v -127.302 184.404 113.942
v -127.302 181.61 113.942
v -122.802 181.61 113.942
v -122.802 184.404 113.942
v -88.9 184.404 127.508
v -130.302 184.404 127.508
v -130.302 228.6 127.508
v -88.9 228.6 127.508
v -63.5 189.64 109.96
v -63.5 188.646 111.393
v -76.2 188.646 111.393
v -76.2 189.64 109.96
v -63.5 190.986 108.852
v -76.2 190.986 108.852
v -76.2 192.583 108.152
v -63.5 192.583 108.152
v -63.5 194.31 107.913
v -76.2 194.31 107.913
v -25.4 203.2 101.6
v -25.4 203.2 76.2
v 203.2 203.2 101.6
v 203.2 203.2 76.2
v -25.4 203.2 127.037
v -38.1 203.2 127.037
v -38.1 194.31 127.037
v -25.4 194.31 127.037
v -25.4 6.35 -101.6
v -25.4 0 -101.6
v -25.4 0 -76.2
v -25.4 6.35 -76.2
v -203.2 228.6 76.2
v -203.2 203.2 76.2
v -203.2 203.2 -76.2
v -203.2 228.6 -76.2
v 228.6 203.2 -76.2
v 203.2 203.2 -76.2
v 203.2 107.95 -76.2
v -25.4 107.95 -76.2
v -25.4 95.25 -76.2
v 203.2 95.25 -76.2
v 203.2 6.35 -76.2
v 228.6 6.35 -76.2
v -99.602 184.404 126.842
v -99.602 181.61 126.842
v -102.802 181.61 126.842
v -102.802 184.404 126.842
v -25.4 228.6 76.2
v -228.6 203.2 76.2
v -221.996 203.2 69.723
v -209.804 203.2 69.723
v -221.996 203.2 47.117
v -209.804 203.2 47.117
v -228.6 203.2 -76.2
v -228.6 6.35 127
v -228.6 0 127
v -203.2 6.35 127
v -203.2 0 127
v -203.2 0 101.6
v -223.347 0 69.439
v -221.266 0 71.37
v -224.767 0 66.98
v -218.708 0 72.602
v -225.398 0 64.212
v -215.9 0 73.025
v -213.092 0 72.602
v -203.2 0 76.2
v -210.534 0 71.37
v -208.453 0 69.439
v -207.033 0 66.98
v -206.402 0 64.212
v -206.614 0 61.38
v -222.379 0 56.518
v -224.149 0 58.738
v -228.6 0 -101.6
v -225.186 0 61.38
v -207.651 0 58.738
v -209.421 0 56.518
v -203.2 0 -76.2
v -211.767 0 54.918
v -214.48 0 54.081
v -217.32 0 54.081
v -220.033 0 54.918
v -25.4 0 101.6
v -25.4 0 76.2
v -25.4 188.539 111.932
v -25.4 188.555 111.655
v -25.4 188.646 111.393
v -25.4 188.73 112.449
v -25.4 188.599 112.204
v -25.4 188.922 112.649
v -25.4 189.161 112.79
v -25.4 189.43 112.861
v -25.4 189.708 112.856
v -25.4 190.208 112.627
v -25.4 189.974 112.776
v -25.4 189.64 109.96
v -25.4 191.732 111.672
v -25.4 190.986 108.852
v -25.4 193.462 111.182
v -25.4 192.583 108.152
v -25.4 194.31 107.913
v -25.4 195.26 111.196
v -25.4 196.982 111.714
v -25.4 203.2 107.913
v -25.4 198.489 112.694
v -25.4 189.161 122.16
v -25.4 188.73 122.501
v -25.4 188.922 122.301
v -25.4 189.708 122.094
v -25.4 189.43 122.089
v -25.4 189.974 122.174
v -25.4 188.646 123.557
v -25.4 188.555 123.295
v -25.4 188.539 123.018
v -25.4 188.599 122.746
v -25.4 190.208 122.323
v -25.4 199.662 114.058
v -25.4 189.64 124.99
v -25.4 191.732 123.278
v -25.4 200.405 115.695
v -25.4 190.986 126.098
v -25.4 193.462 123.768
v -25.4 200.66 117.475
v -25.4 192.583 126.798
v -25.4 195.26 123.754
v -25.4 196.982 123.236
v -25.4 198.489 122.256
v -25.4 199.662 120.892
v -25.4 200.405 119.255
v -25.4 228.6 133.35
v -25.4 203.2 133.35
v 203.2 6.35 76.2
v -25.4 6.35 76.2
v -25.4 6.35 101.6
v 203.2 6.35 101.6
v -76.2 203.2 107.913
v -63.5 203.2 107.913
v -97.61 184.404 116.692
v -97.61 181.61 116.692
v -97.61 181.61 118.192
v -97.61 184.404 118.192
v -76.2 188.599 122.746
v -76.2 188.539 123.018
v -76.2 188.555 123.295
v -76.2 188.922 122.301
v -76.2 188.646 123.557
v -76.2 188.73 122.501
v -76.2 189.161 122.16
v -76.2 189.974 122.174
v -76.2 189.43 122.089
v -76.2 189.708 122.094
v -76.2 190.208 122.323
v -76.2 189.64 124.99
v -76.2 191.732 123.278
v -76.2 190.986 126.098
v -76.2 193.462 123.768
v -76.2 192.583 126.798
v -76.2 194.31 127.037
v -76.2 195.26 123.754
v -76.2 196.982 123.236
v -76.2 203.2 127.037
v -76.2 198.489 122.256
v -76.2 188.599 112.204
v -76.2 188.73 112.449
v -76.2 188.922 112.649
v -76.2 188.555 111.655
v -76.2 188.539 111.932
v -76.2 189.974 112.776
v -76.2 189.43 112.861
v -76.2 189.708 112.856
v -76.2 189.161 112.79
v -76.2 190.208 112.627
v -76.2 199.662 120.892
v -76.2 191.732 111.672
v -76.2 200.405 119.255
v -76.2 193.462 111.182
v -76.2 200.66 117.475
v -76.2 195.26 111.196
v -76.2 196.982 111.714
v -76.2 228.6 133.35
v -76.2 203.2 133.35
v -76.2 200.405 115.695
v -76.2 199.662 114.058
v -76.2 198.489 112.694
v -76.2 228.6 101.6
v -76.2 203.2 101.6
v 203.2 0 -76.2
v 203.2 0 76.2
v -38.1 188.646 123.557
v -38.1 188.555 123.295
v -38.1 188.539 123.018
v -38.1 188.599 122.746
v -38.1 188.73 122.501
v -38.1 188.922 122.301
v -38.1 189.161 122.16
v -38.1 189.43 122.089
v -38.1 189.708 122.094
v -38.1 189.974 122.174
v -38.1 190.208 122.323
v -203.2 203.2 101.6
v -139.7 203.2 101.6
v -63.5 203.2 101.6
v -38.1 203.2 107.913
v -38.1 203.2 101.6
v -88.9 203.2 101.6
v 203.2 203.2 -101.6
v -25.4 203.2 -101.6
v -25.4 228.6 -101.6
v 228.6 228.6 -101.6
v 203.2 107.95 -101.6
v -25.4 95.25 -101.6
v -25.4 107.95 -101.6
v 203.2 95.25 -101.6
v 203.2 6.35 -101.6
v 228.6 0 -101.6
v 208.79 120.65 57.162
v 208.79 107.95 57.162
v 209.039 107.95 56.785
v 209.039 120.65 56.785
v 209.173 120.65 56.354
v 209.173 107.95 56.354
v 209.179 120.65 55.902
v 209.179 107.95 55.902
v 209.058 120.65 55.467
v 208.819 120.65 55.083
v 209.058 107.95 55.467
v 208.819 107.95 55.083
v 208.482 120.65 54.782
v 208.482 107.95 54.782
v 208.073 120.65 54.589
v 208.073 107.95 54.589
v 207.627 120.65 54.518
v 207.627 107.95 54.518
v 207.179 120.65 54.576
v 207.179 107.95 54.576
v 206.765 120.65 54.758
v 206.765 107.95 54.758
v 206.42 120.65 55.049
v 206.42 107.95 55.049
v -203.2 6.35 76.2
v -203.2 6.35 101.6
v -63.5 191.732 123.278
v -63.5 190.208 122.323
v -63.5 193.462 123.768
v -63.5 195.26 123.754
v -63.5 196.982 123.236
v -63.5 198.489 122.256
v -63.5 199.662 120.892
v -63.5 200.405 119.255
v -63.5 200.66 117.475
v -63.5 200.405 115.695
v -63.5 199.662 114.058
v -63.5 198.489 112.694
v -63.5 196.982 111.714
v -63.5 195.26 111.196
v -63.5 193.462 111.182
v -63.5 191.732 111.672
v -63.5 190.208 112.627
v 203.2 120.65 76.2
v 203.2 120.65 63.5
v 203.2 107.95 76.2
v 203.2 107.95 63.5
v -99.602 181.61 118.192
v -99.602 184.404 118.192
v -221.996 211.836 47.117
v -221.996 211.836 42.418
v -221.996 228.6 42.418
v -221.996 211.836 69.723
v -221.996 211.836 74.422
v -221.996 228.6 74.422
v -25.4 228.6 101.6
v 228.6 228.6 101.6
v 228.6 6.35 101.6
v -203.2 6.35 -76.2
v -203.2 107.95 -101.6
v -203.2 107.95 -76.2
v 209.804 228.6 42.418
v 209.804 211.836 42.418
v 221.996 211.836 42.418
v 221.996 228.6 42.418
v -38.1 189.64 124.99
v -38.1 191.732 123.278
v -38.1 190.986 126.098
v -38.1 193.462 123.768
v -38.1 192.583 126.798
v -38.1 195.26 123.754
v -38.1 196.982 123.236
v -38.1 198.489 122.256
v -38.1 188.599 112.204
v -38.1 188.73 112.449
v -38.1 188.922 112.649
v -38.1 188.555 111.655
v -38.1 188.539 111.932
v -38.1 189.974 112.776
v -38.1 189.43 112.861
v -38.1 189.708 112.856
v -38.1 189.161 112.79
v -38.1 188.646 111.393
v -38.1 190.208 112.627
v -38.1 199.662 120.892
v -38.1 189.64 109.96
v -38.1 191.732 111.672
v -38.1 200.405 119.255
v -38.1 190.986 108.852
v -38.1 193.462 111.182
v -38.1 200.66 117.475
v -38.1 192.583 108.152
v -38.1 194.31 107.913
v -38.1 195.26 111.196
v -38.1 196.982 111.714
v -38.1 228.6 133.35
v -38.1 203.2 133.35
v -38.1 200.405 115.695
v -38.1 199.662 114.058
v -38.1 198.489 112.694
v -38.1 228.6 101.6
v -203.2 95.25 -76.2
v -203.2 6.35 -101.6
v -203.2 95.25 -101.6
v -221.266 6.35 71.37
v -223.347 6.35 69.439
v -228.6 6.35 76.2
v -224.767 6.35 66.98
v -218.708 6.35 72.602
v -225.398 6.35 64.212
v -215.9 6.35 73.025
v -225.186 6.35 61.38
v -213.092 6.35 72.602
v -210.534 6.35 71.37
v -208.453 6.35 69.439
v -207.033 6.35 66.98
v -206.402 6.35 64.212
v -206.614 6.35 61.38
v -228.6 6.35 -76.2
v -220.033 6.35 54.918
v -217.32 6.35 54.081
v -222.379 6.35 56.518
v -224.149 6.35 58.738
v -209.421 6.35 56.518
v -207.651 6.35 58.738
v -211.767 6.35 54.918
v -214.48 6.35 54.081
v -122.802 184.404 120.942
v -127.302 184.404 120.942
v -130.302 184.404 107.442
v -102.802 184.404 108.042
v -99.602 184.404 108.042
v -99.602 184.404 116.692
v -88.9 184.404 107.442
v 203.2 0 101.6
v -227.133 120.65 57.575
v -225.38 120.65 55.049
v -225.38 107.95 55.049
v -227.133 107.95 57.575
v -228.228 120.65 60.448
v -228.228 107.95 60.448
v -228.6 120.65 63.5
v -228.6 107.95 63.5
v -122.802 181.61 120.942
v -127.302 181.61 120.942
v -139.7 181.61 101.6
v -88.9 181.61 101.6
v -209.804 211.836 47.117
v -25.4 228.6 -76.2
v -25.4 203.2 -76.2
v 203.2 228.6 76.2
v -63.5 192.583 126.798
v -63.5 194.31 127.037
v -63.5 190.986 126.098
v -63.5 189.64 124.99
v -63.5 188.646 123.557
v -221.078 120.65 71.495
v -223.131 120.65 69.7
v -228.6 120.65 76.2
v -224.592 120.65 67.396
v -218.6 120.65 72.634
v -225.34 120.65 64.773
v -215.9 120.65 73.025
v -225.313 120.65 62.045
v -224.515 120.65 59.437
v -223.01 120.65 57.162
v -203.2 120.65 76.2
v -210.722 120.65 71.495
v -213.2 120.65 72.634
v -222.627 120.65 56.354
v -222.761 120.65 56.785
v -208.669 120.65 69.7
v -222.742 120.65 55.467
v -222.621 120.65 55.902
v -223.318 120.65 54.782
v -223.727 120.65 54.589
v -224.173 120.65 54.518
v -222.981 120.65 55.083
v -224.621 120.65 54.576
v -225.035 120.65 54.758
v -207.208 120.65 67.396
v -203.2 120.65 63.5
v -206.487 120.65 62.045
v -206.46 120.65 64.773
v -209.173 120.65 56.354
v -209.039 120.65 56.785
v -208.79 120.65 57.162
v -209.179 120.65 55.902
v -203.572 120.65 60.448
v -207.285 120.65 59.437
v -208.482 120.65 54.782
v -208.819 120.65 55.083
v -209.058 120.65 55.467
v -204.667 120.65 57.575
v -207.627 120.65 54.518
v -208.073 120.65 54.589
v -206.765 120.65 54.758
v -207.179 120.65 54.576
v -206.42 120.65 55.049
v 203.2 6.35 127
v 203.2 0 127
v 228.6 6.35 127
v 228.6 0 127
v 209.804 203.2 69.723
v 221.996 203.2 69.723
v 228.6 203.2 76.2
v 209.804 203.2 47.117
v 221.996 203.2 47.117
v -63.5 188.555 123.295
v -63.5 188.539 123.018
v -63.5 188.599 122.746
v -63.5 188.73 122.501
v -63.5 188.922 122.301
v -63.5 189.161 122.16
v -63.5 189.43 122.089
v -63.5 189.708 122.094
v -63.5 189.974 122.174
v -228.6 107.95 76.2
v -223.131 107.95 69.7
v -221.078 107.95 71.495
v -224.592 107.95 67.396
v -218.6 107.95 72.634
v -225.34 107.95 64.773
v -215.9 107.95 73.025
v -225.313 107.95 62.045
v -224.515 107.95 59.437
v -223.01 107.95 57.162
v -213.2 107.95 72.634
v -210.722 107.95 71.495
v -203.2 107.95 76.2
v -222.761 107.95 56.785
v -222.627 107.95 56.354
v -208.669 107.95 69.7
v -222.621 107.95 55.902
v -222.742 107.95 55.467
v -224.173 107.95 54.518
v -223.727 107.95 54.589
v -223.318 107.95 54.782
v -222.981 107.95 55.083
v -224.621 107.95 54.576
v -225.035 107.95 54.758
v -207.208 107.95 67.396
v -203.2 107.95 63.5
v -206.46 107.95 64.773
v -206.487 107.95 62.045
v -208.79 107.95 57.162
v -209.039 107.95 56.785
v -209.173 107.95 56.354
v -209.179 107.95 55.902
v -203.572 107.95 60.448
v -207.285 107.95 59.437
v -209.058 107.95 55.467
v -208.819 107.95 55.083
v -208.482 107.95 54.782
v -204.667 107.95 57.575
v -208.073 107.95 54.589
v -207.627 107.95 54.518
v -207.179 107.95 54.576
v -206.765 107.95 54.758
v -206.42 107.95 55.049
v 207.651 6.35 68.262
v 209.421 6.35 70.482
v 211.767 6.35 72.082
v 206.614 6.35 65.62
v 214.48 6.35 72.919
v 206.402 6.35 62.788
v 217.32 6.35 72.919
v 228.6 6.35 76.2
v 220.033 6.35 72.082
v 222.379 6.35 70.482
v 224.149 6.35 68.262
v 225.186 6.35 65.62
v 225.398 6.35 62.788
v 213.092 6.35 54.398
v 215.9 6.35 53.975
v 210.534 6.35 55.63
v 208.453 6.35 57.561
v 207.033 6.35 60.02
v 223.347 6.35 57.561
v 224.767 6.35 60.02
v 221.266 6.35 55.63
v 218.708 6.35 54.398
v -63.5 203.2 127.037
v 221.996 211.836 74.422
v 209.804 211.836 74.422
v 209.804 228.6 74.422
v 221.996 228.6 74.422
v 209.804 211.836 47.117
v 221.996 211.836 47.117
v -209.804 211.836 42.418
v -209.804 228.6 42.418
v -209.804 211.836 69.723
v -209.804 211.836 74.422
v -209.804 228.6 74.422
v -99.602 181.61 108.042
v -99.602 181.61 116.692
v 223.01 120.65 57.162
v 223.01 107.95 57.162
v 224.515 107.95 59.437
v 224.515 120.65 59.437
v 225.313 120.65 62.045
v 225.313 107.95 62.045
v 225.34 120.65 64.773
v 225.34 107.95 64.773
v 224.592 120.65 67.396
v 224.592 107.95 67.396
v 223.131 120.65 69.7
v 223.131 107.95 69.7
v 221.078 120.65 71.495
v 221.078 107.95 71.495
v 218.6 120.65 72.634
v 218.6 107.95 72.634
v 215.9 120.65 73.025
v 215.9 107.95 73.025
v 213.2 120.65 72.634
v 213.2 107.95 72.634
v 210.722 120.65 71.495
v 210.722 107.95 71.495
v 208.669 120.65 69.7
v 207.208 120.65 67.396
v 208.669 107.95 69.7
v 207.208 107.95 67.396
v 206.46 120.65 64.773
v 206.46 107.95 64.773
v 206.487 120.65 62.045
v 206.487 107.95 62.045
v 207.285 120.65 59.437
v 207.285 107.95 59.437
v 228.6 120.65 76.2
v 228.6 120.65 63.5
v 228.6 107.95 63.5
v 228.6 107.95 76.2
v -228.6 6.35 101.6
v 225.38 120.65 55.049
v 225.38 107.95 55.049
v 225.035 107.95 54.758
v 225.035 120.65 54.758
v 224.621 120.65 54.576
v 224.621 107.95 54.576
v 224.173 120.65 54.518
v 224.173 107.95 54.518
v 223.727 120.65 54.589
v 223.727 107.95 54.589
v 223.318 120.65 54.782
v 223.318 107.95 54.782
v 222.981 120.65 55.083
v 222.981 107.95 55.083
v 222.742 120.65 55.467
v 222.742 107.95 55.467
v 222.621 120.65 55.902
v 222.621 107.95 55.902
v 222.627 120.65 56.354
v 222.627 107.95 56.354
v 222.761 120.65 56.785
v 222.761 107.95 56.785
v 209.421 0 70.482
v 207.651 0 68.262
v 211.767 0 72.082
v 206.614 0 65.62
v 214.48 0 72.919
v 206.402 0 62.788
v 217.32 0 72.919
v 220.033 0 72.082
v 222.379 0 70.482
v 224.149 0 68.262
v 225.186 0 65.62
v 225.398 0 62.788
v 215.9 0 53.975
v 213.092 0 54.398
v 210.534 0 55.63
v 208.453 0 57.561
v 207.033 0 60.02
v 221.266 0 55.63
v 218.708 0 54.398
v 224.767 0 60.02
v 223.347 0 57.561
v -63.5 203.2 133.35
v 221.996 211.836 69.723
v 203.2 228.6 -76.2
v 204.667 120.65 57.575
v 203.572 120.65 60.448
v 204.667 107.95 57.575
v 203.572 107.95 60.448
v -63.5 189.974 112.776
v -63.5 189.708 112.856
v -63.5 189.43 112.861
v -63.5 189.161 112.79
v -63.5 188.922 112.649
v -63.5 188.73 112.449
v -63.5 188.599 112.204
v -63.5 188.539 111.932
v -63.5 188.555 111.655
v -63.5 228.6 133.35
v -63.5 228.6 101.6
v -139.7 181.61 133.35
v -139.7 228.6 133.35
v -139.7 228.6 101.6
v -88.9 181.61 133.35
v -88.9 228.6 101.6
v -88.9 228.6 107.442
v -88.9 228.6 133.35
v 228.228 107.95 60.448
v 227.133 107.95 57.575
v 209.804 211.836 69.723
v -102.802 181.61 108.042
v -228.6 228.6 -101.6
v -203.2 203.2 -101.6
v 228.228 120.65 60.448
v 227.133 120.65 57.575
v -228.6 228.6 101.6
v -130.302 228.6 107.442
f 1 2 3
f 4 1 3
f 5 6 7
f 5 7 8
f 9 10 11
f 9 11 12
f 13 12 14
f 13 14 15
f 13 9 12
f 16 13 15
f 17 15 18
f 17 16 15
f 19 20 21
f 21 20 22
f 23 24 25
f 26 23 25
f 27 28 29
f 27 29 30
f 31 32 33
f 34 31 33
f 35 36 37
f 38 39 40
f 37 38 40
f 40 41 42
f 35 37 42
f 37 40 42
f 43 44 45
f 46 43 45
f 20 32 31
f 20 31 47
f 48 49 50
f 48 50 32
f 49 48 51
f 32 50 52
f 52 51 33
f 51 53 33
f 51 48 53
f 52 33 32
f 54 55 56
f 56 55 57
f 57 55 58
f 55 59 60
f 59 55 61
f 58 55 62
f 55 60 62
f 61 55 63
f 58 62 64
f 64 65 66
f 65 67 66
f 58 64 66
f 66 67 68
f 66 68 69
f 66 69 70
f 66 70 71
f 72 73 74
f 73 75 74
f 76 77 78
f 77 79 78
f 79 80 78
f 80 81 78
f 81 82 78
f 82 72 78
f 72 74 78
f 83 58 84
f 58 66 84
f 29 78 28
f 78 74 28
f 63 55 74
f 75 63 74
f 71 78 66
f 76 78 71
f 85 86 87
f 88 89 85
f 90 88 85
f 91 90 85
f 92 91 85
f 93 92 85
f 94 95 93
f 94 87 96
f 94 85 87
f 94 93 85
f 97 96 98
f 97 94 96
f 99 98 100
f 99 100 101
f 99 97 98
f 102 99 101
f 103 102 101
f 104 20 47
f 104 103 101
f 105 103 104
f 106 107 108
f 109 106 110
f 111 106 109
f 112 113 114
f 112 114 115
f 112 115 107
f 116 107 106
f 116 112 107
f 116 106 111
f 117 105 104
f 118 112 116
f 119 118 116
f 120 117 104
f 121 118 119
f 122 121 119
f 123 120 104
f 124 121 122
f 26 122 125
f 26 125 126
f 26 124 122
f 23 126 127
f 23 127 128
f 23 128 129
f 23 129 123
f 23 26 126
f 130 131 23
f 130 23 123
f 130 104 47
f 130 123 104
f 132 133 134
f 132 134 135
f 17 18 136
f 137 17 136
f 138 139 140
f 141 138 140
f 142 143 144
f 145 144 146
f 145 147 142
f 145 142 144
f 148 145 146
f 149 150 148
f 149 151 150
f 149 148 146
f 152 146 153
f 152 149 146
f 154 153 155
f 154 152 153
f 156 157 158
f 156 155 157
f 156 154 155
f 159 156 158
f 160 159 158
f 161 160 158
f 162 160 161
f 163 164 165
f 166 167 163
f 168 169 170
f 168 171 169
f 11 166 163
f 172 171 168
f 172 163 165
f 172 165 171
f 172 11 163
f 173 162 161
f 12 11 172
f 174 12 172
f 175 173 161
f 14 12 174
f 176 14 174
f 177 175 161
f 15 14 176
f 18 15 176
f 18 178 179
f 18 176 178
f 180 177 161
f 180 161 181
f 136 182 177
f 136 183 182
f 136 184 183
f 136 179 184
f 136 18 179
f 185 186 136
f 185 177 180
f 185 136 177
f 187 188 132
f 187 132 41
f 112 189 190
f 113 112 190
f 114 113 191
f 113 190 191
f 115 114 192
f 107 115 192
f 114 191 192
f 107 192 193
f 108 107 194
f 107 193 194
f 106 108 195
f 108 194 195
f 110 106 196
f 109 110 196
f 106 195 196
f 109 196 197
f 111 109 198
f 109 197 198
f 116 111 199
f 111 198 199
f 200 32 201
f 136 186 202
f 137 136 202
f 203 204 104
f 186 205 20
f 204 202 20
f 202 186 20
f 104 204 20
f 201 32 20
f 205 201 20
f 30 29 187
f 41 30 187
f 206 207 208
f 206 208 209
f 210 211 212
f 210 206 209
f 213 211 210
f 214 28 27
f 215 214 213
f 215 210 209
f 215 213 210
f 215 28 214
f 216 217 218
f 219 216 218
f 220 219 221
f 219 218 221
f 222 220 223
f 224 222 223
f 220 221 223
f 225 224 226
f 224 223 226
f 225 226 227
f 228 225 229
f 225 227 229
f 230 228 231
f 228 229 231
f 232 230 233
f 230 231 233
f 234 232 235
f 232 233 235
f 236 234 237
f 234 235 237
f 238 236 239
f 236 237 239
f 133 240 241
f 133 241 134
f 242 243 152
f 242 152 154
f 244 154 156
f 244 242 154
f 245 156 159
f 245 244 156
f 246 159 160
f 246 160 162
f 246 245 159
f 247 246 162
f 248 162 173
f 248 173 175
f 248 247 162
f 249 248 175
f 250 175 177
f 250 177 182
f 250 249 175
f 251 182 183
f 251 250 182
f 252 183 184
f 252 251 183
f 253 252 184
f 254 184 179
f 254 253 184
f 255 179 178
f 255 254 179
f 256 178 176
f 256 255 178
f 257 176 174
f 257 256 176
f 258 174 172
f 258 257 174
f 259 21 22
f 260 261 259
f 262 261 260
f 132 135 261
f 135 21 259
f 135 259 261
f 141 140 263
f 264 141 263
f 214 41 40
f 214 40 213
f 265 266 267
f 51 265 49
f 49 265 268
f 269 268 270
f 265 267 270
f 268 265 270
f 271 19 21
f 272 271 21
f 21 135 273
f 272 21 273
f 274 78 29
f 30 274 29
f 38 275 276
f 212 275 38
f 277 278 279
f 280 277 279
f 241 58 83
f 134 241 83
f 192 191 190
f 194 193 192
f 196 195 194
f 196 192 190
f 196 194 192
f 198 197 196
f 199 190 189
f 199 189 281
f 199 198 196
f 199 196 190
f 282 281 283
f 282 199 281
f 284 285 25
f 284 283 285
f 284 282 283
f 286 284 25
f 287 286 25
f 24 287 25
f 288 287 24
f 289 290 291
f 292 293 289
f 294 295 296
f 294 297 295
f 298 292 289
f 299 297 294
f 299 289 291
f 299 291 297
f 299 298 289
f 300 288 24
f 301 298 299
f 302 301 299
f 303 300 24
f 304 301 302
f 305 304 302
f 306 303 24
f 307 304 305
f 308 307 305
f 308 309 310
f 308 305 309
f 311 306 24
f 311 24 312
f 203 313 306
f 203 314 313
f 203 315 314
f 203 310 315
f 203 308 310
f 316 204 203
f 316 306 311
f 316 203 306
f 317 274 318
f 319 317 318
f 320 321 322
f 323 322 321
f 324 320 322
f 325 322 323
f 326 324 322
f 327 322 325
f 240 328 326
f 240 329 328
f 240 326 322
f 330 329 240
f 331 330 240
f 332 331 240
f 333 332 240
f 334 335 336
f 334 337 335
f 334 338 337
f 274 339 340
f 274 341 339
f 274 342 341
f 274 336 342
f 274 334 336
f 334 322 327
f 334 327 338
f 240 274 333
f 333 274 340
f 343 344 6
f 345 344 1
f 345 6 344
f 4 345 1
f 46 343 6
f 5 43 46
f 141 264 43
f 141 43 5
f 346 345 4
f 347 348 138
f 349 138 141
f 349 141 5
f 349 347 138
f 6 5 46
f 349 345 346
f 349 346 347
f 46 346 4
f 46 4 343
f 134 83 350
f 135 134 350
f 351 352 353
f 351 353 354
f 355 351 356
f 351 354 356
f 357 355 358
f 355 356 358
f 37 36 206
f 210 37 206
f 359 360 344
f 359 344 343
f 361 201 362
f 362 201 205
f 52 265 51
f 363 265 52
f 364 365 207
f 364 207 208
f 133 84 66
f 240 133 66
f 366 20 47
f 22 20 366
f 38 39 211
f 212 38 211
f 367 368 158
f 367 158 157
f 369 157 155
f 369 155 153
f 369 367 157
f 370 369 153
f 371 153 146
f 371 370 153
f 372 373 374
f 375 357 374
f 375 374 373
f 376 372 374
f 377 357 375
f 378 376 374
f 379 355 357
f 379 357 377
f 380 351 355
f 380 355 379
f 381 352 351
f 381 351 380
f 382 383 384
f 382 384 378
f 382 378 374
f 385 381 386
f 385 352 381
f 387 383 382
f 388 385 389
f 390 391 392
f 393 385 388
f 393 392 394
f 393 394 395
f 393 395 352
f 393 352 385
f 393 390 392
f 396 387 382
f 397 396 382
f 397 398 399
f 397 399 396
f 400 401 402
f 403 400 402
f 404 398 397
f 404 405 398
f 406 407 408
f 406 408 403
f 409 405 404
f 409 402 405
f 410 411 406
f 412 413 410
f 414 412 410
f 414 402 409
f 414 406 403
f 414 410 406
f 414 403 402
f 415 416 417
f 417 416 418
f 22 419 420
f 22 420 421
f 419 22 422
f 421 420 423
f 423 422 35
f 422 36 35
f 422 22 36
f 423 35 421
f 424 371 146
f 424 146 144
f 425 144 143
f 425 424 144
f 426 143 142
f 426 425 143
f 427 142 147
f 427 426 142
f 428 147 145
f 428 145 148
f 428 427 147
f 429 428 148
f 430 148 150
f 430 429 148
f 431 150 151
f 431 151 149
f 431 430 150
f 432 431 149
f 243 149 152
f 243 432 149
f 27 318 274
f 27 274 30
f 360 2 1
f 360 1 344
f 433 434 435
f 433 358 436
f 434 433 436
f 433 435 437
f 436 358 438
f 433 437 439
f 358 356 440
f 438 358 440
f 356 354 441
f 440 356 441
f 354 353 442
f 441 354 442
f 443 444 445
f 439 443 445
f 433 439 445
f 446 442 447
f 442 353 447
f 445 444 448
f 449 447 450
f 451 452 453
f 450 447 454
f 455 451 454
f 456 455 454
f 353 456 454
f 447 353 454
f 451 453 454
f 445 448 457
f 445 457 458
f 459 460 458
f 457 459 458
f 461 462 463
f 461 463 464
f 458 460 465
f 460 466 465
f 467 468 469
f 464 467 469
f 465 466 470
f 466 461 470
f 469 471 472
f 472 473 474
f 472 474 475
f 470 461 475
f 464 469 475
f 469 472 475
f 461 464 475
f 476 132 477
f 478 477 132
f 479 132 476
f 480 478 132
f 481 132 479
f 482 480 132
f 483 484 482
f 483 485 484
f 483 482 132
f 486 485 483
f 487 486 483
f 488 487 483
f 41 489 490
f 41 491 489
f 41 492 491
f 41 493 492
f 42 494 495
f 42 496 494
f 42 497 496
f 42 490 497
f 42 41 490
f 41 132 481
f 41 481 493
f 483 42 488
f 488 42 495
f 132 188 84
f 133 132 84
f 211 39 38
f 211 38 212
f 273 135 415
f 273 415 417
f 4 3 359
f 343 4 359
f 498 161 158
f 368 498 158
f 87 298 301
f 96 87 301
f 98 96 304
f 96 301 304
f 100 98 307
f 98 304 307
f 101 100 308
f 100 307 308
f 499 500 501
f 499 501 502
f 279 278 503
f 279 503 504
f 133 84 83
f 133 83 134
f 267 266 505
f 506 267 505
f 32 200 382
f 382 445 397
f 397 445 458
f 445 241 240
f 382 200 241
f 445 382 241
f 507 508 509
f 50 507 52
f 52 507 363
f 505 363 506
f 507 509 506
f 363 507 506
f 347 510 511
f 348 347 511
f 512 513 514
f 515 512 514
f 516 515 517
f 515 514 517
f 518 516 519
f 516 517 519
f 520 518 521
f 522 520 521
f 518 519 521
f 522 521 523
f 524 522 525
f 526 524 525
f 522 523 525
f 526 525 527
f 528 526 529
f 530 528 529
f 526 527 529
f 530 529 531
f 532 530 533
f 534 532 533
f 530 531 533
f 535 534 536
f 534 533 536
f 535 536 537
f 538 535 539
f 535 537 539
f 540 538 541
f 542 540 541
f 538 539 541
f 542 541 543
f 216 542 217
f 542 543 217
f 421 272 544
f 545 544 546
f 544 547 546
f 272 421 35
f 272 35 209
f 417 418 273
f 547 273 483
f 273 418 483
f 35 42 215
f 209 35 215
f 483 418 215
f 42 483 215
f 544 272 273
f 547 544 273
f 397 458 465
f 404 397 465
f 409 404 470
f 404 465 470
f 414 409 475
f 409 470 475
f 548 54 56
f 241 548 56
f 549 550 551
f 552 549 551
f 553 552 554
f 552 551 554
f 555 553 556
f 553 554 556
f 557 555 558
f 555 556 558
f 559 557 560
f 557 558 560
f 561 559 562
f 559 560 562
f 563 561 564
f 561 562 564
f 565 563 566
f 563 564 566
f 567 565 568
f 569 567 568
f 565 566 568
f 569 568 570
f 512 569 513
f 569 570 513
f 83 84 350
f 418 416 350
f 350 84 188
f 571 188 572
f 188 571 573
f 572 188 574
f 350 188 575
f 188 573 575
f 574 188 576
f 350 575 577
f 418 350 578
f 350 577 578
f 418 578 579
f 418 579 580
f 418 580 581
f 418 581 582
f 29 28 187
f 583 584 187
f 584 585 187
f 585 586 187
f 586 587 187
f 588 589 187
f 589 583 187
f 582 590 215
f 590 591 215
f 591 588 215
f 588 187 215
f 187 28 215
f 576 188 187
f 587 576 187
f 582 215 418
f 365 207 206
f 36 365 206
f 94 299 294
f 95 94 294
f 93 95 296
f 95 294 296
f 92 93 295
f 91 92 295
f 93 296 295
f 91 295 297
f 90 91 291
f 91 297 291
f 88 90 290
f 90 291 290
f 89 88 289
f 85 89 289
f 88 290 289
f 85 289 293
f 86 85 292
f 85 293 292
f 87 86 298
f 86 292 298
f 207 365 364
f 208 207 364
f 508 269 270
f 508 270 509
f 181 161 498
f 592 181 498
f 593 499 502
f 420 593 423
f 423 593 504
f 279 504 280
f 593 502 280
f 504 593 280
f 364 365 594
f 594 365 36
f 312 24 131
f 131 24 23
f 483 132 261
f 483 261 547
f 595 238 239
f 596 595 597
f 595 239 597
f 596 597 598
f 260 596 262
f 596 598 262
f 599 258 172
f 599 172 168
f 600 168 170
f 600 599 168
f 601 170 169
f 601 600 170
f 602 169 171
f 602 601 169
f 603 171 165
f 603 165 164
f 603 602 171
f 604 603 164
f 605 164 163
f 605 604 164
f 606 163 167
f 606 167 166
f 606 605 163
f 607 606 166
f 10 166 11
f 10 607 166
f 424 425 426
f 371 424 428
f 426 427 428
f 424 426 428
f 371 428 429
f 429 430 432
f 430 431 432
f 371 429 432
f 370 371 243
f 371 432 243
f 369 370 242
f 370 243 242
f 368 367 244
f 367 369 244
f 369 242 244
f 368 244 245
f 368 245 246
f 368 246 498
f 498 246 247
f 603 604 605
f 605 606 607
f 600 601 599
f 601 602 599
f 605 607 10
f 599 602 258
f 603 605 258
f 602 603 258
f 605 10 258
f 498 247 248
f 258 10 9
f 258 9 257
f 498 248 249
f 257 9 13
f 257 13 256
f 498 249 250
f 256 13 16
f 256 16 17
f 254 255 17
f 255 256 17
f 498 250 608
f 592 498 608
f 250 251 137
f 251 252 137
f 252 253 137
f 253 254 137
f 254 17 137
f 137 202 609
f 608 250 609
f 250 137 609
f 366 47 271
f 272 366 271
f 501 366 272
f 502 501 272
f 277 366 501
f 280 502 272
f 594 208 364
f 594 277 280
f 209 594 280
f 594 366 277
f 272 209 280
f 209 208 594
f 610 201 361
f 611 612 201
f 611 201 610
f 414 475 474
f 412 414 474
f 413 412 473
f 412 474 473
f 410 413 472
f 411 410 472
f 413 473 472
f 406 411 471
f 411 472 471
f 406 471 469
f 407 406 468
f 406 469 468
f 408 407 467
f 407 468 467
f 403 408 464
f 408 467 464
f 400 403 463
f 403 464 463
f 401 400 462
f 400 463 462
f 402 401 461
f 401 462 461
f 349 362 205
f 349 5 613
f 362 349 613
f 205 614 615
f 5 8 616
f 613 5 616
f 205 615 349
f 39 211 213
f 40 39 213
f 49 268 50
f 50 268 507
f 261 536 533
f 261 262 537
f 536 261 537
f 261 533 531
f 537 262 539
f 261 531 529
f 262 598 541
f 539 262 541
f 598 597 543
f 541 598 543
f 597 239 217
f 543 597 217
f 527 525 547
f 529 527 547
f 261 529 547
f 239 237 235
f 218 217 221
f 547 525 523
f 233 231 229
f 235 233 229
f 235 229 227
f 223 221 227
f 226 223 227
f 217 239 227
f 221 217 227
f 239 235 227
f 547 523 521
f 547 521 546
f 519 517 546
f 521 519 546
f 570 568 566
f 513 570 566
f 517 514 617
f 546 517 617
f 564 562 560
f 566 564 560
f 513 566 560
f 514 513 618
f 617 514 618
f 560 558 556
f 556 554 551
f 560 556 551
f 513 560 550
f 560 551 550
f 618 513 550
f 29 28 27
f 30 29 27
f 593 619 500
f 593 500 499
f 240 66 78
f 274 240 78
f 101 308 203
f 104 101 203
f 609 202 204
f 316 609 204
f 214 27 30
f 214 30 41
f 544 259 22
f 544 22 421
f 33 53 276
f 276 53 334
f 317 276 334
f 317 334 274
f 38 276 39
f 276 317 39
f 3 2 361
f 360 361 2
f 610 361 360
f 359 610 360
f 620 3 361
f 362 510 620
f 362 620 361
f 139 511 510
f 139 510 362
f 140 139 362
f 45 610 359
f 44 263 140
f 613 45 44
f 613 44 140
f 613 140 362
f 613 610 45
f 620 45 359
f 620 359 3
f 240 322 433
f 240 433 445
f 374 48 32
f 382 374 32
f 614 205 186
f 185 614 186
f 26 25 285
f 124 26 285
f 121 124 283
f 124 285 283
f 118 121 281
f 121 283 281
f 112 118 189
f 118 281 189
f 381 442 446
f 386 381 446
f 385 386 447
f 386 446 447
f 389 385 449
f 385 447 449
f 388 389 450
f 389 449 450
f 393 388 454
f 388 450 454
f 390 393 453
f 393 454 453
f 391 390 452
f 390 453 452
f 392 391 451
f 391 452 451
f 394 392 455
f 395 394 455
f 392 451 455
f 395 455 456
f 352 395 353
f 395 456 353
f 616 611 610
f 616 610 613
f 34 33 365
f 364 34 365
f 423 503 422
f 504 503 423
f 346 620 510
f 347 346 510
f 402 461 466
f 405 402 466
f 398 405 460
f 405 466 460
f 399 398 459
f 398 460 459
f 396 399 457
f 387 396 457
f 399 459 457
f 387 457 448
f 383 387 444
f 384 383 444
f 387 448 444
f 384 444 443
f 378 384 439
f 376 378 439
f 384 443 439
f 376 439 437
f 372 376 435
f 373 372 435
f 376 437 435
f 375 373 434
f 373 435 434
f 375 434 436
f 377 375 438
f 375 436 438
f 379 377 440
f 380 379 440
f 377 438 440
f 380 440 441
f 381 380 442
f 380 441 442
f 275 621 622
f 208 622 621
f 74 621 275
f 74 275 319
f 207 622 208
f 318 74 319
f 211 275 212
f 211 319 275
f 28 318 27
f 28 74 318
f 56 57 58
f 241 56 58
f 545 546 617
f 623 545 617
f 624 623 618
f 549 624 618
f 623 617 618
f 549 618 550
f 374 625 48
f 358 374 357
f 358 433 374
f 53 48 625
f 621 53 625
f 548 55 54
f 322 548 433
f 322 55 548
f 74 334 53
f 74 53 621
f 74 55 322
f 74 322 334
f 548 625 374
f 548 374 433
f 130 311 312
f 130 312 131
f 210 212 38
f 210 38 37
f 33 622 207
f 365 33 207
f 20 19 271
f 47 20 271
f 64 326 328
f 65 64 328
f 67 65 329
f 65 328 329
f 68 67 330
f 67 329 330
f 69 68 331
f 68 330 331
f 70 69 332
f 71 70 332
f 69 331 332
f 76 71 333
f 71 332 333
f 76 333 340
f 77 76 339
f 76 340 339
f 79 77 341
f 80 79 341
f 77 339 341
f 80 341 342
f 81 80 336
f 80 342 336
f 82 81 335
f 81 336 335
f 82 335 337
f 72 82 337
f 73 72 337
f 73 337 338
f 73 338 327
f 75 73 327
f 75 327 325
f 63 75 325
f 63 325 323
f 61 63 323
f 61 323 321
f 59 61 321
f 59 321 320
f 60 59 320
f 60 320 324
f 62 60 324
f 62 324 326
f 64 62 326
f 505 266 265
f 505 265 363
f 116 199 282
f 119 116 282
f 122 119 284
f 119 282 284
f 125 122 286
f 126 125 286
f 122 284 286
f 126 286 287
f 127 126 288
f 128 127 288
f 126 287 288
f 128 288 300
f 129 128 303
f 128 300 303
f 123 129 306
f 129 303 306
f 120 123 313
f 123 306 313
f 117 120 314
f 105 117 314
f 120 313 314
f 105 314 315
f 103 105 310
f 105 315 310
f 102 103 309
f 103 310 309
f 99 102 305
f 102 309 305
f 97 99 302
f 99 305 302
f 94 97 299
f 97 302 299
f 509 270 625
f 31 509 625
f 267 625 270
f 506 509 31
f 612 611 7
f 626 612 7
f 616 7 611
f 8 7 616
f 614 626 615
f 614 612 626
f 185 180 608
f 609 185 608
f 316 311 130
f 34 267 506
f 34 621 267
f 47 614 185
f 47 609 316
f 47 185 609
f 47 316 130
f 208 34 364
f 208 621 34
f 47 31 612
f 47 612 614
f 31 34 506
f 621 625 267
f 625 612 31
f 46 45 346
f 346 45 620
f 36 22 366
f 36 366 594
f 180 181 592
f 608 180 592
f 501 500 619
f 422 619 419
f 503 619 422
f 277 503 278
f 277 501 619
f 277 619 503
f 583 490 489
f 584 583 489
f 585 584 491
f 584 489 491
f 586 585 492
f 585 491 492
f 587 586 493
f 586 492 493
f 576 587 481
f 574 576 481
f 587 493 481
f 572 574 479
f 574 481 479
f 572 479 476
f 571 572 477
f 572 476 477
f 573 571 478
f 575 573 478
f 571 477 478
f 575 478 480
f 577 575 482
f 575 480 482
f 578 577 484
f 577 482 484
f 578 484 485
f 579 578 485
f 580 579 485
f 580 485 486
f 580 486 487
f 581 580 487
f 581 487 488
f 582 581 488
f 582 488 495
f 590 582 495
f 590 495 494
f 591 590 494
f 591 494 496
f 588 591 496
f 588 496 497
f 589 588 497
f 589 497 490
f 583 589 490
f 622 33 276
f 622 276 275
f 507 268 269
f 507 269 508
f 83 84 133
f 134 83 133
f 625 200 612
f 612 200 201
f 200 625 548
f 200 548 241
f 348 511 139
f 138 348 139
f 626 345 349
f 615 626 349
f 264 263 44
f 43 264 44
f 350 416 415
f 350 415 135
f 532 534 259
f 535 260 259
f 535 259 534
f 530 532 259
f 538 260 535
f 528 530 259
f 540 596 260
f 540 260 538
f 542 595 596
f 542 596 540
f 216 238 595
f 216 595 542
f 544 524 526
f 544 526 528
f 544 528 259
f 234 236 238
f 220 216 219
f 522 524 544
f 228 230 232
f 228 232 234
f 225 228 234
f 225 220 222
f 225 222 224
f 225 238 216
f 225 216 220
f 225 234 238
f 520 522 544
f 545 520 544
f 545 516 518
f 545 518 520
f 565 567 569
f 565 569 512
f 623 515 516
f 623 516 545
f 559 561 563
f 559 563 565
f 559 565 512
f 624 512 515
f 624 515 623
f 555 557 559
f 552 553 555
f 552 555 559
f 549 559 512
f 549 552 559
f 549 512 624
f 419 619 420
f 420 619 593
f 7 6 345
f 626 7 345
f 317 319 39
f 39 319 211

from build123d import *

# Parameters (mm, degrees)
SKETCH1_W            = 25.4
SKETCH1_H            = 25.4
SKETCH1_W_2          = 406.4
SKETCH1_H_2          = 152.4
BOSS_EXTRUDE1_DEPTH  = 6.35
SKETCH1_4_W          = 25.4
SKETCH1_4_H          = 25.4
BOSS_EXTRUDE2_DEPTH  = 228.6
BOSS_EXTRUDE3_START  = 203.2
SKETCH1_5_W          = 406.4
SKETCH1_5_H          = 25.4
SKETCH1_5_W_2        = 25.4
SKETCH1_5_H_2        = 152.4
BOSS_EXTRUDE3_DEPTH  = 25.4
SKETCH2_W            = 50.8
SKETCH2_H            = 25.4
SKETCH2_W_2          = 12.7
BOSS_EXTRUDE4_DEPTH  = 31.75
SKETCH11_R           = 9.525
CUT_EXTRUDE6_DEPTH   = 346.594046534
SKETCH12_W           = 12.192
SKETCH12_H           = 22.606
SKETCH12_H_2         = 4.699
CUT_EXTRUDE7_DEPTH   = 16.764
SKETCH12_3_W         = 12.192
SKETCH12_3_H         = 22.606
CUT_EXTRUDE8_DEPTH   = 25.4
SKETCH13_W           = 12.192
SKETCH13_H           = 22.606
CUT_EXTRUDE9_DEPTH   = 25.4
SKETCH13_3_W         = 12.192
SKETCH13_3_H         = 4.699
CUT_EXTRUDE10_DEPTH  = 16.764
BOSS_EXTRUDE7_START  = 88.9
SKETCH14_W           = 177.8
SKETCH14_H           = 25.4
BOSS_EXTRUDE7_DEPTH  = 12.7
BOSS_EXTRUDE8_START  = 88.9
SKETCH14_3_W         = 228.6
SKETCH14_3_H         = 25.4
BOSS_EXTRUDE8_DEPTH  = 12.7
BOSS_EXTRUDE9_START  = 101.6
BOSS_EXTRUDE9_DEPTH  = 12.7
BOSS_EXTRUDE10_START = 101.6
BOSS_EXTRUDE10_DEPTH = 12.7
BOSS_EXTRUDE11_START = -12.7
BOSS_EXTRUDE11_DEPTH = 12.7
BOSS_EXTRUDE12_START = -38.1
BOSS_EXTRUDE12_DEPTH = 12.7
SKETCH18_W           = 50.8
SKETCH18_H           = 31.75
BOSS_EXTRUDE13_DEPTH = 21.59
SKETCH19_W           = 41.402
SKETCH19_H           = 20.066
CUT_EXTRUDE11_DEPTH  = 44.196
SKETCH20_W           = 4.5
SKETCH20_H           = 7
CUT_EXTRUDE13_DEPTH  = 321.970987162


# Read off the part's stored shape, not the designer's step: Split1, Boss-Extrude11
with BuildPart() as part:
    # Sketch1 → Boss-Extrude1 (new body)
    with BuildSketch(Plane(origin=(0, 0, 0), x_dir=(1, 0, 0), z_dir=(0, 1, 0))):
        with Locations((-215.9, -88.9)):
            Rectangle(SKETCH1_W, SKETCH1_H)
        with Locations((-215.9, -114.3)):
            Rectangle(SKETCH1_W, SKETCH1_H)
        with Locations((0, -88.9)):
            Rectangle(SKETCH1_W_2, SKETCH1_H)
        with Locations((215.9, -88.9)):
            Rectangle(SKETCH1_W, SKETCH1_H)
        with Locations((215.9, -114.3)):
            Rectangle(SKETCH1_W, SKETCH1_H)
        with Locations((0, 88.9)):
            Rectangle(SKETCH1_W_2, SKETCH1_H)
        with Locations((-215.9, 0)):
            Rectangle(SKETCH1_W, SKETCH1_H_2)
        with Locations((215.9, 0)):
            Rectangle(SKETCH1_W, SKETCH1_H_2)
    extrude(amount=BOSS_EXTRUDE1_DEPTH)

    # Sketch1<4> → Boss-Extrude2 (add)
    with BuildSketch(Plane(origin=(0, 0, 0), x_dir=(1, 0, 0), z_dir=(0, 1, 0))):
        with Locations((-215.9, -88.9)):
            Rectangle(SKETCH1_4_W, SKETCH1_4_H)
        with Locations((215.9, -88.9)):
            Rectangle(SKETCH1_4_W, SKETCH1_4_H)
        with Locations((215.9, 88.9)):
            Rectangle(SKETCH1_4_W, SKETCH1_4_H)
        with Locations((-215.9, 88.9)):
            Rectangle(SKETCH1_4_W, SKETCH1_4_H)
    extrude(amount=BOSS_EXTRUDE2_DEPTH)

    # Sketch1<5> → Boss-Extrude3 (add)
    with BuildSketch(Plane(origin=(0, 0, 0), x_dir=(1, 0, 0), z_dir=(0, 1, 0)).offset(BOSS_EXTRUDE3_START)):
        with Locations((0, 88.9)):
            Rectangle(SKETCH1_5_W, SKETCH1_5_H)
        with Locations((0, -88.9)):
            Rectangle(SKETCH1_5_W, SKETCH1_5_H)
        with Locations((-215.9, 0)):
            Rectangle(SKETCH1_5_W_2, SKETCH1_5_H_2)
        with Locations((215.9, 0)):
            Rectangle(SKETCH1_5_W_2, SKETCH1_5_H_2)
    extrude(amount=BOSS_EXTRUDE3_DEPTH)

    # Sketch2 → Boss-Extrude4 (add)
    with BuildSketch(Plane.XY.offset(101.6)):
        with Locations((-114.3, 215.9)):
            Rectangle(SKETCH2_W, SKETCH2_H)
        with Locations((-69.85, 215.9)):
            Rectangle(SKETCH2_W_2, SKETCH2_H)
        with Locations((-31.75, 215.9)):
            Rectangle(SKETCH2_W_2, SKETCH2_H)
    extrude(amount=BOSS_EXTRUDE4_DEPTH)


with BuildPart() as body_2:
    # Split1: the piece on the far side of the plane
    add(part.part)
    split(bisect_by=Plane.YZ.offset(-25.4), keep=Keep.BOTTOM)


with BuildPart() as part_1:
    add(part.part)

    # Split1
    split(bisect_by=Plane.YZ.offset(-25.4), keep=Keep.TOP)


with BuildPart() as cut_extrude6_tool:
    # Sketch11 → Cut-Extrude6 (new, through all)
    with BuildSketch(Plane(origin=(0, 6.35, 0), x_dir=(1, 0, 0), z_dir=(0, 1, 0))):
        with Locations(Location((-215.9, -63.5, 0), (0, 0, 270))):
            Circle(SKETCH11_R)
        with Locations(Location((215.9, -63.5, 0), (0, 0, 90))):
            Circle(SKETCH11_R)
    extrude(amount=-CUT_EXTRUDE6_DEPTH)


with BuildPart() as part_2:
    add(part_1.part)

    # Cut-Extrude6: cut by cut_extrude6_tool
    add(cut_extrude6_tool.part, mode=Mode.SUBTRACT)

    # Sketch13 → Cut-Extrude9 (cut)
    with BuildSketch(Plane(origin=(0, 228.6, 0), x_dir=(1, 0, 0), z_dir=(0, 1, 0))):
        with Locations((215.9, -58.42)):
            Rectangle(SKETCH13_W, SKETCH13_H)
    extrude(amount=-CUT_EXTRUDE9_DEPTH, mode=Mode.SUBTRACT)

    # Sketch13<3> → Cut-Extrude10 (cut)
    with BuildSketch(Plane(origin=(0, 228.6, 0), x_dir=(1, 0, 0), z_dir=(0, 1, 0))):
        with Locations((215.9, -44.7675)):
            Rectangle(SKETCH13_3_W, SKETCH13_3_H)
        with Locations((215.9, -72.0725)):
            Rectangle(SKETCH13_3_W, SKETCH13_3_H)
    extrude(amount=-CUT_EXTRUDE10_DEPTH, mode=Mode.SUBTRACT)


with BuildPart() as body_2_1:
    add(body_2.part)

    # Cut-Extrude6: cut by cut_extrude6_tool
    add(cut_extrude6_tool.part, mode=Mode.SUBTRACT)

    # Sketch12 → Cut-Extrude7 (cut)
    with BuildSketch(Plane(origin=(0, 228.6, 0), x_dir=(1, 0, 0), z_dir=(0, 1, 0))):
        with Locations((-215.9, -58.42)):
            Rectangle(SKETCH12_W, SKETCH12_H)
        with Locations((-215.9, -44.7675)):
            Rectangle(SKETCH12_W, SKETCH12_H_2)
        with Locations((-215.9, -72.0725)):
            Rectangle(SKETCH12_W, SKETCH12_H_2)
    extrude(amount=-CUT_EXTRUDE7_DEPTH, mode=Mode.SUBTRACT)

    # Sketch12<3> → Cut-Extrude8 (cut)
    with BuildSketch(Plane(origin=(0, 228.6, 0), x_dir=(1, 0, 0), z_dir=(0, 1, 0))):
        with Locations((-215.9, -58.42)):
            Rectangle(SKETCH12_3_W, SKETCH12_3_H)
    extrude(amount=-CUT_EXTRUDE8_DEPTH, mode=Mode.SUBTRACT)


with BuildPart() as body_3:
    # Sketch14 → Boss-Extrude7 (new body)
    with BuildSketch(Plane(origin=(0, 6.35, 0), x_dir=(1, 0, 0), z_dir=(0, 1, 0)).offset(BOSS_EXTRUDE7_START)):
        with Locations((-114.3, 88.9)):
            Rectangle(SKETCH14_W, SKETCH14_H)
    extrude(amount=BOSS_EXTRUDE7_DEPTH)

    # Combine1: union body 2
    add(body_2_1.part)

    # Sketch16<3> → Boss-Extrude10 (add)
    with BuildSketch(Plane(origin=(0, 6.35, 0), x_dir=(1, 0, 0), z_dir=(0, 1, 0)).offset(BOSS_EXTRUDE10_START)):
        with BuildLine():
            Line((-228.6, -76.2), (-203.2, -76.2))
            Line((-203.2, -76.2), (-203.2, -63.5))
            ThreePointArc((-203.2, -63.5), (-204.032171439, -58.978424472), (-206.419629175, -55.049404222))
            ThreePointArc((-206.419629175, -55.049404222), (-208.661, -54.920682341), (-208.789721881, -57.162053166))
            ThreePointArc((-208.789721881, -57.162053166), (-215.9, -73.025), (-223.010278119, -57.162053166))
            ThreePointArc((-223.010278119, -57.162053166), (-223.139, -54.920682341), (-225.380370825, -55.049404222))
            ThreePointArc((-225.380370825, -55.049404222), (-227.767828561, -58.978424472), (-228.6, -63.5))
            Line((-228.6, -63.5), (-228.6, -76.2))
        make_face()
    extrude(amount=BOSS_EXTRUDE10_DEPTH)


with BuildPart() as body_3_2:
    # Sketch14<3> → Boss-Extrude8 (new body)
    with BuildSketch(Plane(origin=(0, 6.35, 0), x_dir=(1, 0, 0), z_dir=(0, 1, 0)).offset(BOSS_EXTRUDE8_START)):
        with Locations((88.9, 88.9)):
            Rectangle(SKETCH14_3_W, SKETCH14_3_H)
    extrude(amount=BOSS_EXTRUDE8_DEPTH)

    # Combine2: union part
    add(part_2.part)

    # Sketch16 → Boss-Extrude9 (add)
    with BuildSketch(Plane(origin=(0, 6.35, 0), x_dir=(1, 0, 0), z_dir=(0, 1, 0)).offset(BOSS_EXTRUDE9_START)):
        with BuildLine():
            Line((228.6, -76.2), (228.6, -63.5))
            ThreePointArc((228.6, -63.5), (227.767828561, -58.978424472), (225.380370825, -55.049404222))
            ThreePointArc((225.380370825, -55.049404222), (223.139, -54.920682341), (223.010278119, -57.162053166))
            ThreePointArc((223.010278119, -57.162053166), (215.9, -73.025), (208.789721881, -57.162053166))
            ThreePointArc((208.789721881, -57.162053166), (208.661, -54.920682341), (206.419629175, -55.049404222))
            ThreePointArc((206.419629175, -55.049404222), (204.032171439, -58.978424472), (203.2, -63.5))
            Line((203.2, -63.5), (203.2, -76.2))
            Line((203.2, -76.2), (228.6, -76.2))
        make_face()
    extrude(amount=BOSS_EXTRUDE9_DEPTH)


with BuildPart() as body_3_3:
    # Boss-Extrude11 outline → Boss-Extrude11 (new body)
    with BuildSketch(Plane(origin=(-25.4, 0, 0), x_dir=(0, 0, -1), z_dir=(1, 0, 0)).offset(BOSS_EXTRUDE11_START)):
        with BuildLine():
            Line((-107.912924793, 194.31), (-107.912924793, 203.2))
            Line((-107.912924793, 203.2), (-127.037075207, 203.2))
            Line((-127.037075207, 203.2), (-127.037075207, 194.31))
            ThreePointArc((-127.037075207, 194.31), (-126.097662943, 190.986140746), (-123.557377461, 188.645737915))
            ThreePointArc((-123.557377461, 188.645737915), (-122.301, 188.922066518), (-122.322525086, 190.208292973))
            ThreePointArc((-122.322525086, 190.208292973), (-117.475, 200.66), (-112.627474914, 190.208292973))
            ThreePointArc((-112.627474914, 190.208292973), (-112.649, 188.922066518), (-111.392622539, 188.645737915))
            ThreePointArc((-111.392622539, 188.645737915), (-108.852337057, 190.986140746), (-107.912924793, 194.31))
        make_face()
    extrude(amount=BOSS_EXTRUDE11_DEPTH)


with BuildPart() as body_4:
    # Sketch17<2> → Boss-Extrude12 (new body)
    with BuildSketch(Plane(origin=(-25.4, 0, 0), x_dir=(0, 0, -1), z_dir=(1, 0, 0)).offset(BOSS_EXTRUDE12_START)):
        with BuildLine():
            Line((-107.912924793, 203.2), (-127.037075207, 203.2))
            Line((-127.037075207, 203.2), (-127.037075207, 194.31))
            ThreePointArc((-127.037075207, 194.31), (-126.097662943, 190.986140745), (-123.557377461, 188.645737915))
            ThreePointArc((-123.557377461, 188.645737915), (-122.301, 188.922066518), (-122.322525086, 190.208292973))
            ThreePointArc((-122.322525086, 190.208292973), (-117.475, 200.66), (-112.627474914, 190.208292973))
            ThreePointArc((-112.627474914, 190.208292973), (-112.649, 188.922066518), (-111.392622539, 188.645737915))
            ThreePointArc((-111.392622539, 188.645737915), (-108.852337057, 190.986140745), (-107.912924793, 194.31))
            Line((-107.912924793, 194.31), (-107.912924793, 203.2))
        make_face()
    extrude(amount=-BOSS_EXTRUDE12_DEPTH)


with BuildPart() as body_5:
    # Sketch18 → Boss-Extrude13 (new body)
    with BuildSketch(Plane.XZ.offset(-203.2)):
        with Locations((-114.3, 117.475)):
            Rectangle(SKETCH18_W, SKETCH18_H)
    extrude(amount=BOSS_EXTRUDE13_DEPTH)


with BuildPart() as body_3_1:
    add(body_3.part)

    # Combine3: union body 3 3, body 5, body 4
    add(body_3_3.part)
    add(body_5.part)
    add(body_4.part)

    # Sketch19 → Cut-Extrude11 (cut)
    with BuildSketch(Plane(origin=(0, 228.6, 0), x_dir=(1, 0, 0), z_dir=(0, 1, 0))):
        with Locations((-109.601, -117.475)):
            Rectangle(SKETCH19_W, SKETCH19_H)
    extrude(amount=-CUT_EXTRUDE11_DEPTH, mode=Mode.SUBTRACT)

    # Sketch20 → Cut-Extrude13 (cut, through all)
    with BuildSketch(Plane.XZ.offset(-181.61)):
        Polygon((-97.610434743, 116.692), (-97.610434743, 118.192), (-99.602, 118.192), (-99.602, 126.842), (-102.802, 126.842), (-102.802, 108.042), (-99.602, 108.042), (-99.602, 116.692), align=None)
        with Locations((-125.052, 117.442)):
            Rectangle(SKETCH20_W, SKETCH20_H)
    extrude(amount=-CUT_EXTRUDE13_DEPTH, mode=Mode.SUBTRACT)


solid = Compound([body_3_2.part, body_3_1.part])
